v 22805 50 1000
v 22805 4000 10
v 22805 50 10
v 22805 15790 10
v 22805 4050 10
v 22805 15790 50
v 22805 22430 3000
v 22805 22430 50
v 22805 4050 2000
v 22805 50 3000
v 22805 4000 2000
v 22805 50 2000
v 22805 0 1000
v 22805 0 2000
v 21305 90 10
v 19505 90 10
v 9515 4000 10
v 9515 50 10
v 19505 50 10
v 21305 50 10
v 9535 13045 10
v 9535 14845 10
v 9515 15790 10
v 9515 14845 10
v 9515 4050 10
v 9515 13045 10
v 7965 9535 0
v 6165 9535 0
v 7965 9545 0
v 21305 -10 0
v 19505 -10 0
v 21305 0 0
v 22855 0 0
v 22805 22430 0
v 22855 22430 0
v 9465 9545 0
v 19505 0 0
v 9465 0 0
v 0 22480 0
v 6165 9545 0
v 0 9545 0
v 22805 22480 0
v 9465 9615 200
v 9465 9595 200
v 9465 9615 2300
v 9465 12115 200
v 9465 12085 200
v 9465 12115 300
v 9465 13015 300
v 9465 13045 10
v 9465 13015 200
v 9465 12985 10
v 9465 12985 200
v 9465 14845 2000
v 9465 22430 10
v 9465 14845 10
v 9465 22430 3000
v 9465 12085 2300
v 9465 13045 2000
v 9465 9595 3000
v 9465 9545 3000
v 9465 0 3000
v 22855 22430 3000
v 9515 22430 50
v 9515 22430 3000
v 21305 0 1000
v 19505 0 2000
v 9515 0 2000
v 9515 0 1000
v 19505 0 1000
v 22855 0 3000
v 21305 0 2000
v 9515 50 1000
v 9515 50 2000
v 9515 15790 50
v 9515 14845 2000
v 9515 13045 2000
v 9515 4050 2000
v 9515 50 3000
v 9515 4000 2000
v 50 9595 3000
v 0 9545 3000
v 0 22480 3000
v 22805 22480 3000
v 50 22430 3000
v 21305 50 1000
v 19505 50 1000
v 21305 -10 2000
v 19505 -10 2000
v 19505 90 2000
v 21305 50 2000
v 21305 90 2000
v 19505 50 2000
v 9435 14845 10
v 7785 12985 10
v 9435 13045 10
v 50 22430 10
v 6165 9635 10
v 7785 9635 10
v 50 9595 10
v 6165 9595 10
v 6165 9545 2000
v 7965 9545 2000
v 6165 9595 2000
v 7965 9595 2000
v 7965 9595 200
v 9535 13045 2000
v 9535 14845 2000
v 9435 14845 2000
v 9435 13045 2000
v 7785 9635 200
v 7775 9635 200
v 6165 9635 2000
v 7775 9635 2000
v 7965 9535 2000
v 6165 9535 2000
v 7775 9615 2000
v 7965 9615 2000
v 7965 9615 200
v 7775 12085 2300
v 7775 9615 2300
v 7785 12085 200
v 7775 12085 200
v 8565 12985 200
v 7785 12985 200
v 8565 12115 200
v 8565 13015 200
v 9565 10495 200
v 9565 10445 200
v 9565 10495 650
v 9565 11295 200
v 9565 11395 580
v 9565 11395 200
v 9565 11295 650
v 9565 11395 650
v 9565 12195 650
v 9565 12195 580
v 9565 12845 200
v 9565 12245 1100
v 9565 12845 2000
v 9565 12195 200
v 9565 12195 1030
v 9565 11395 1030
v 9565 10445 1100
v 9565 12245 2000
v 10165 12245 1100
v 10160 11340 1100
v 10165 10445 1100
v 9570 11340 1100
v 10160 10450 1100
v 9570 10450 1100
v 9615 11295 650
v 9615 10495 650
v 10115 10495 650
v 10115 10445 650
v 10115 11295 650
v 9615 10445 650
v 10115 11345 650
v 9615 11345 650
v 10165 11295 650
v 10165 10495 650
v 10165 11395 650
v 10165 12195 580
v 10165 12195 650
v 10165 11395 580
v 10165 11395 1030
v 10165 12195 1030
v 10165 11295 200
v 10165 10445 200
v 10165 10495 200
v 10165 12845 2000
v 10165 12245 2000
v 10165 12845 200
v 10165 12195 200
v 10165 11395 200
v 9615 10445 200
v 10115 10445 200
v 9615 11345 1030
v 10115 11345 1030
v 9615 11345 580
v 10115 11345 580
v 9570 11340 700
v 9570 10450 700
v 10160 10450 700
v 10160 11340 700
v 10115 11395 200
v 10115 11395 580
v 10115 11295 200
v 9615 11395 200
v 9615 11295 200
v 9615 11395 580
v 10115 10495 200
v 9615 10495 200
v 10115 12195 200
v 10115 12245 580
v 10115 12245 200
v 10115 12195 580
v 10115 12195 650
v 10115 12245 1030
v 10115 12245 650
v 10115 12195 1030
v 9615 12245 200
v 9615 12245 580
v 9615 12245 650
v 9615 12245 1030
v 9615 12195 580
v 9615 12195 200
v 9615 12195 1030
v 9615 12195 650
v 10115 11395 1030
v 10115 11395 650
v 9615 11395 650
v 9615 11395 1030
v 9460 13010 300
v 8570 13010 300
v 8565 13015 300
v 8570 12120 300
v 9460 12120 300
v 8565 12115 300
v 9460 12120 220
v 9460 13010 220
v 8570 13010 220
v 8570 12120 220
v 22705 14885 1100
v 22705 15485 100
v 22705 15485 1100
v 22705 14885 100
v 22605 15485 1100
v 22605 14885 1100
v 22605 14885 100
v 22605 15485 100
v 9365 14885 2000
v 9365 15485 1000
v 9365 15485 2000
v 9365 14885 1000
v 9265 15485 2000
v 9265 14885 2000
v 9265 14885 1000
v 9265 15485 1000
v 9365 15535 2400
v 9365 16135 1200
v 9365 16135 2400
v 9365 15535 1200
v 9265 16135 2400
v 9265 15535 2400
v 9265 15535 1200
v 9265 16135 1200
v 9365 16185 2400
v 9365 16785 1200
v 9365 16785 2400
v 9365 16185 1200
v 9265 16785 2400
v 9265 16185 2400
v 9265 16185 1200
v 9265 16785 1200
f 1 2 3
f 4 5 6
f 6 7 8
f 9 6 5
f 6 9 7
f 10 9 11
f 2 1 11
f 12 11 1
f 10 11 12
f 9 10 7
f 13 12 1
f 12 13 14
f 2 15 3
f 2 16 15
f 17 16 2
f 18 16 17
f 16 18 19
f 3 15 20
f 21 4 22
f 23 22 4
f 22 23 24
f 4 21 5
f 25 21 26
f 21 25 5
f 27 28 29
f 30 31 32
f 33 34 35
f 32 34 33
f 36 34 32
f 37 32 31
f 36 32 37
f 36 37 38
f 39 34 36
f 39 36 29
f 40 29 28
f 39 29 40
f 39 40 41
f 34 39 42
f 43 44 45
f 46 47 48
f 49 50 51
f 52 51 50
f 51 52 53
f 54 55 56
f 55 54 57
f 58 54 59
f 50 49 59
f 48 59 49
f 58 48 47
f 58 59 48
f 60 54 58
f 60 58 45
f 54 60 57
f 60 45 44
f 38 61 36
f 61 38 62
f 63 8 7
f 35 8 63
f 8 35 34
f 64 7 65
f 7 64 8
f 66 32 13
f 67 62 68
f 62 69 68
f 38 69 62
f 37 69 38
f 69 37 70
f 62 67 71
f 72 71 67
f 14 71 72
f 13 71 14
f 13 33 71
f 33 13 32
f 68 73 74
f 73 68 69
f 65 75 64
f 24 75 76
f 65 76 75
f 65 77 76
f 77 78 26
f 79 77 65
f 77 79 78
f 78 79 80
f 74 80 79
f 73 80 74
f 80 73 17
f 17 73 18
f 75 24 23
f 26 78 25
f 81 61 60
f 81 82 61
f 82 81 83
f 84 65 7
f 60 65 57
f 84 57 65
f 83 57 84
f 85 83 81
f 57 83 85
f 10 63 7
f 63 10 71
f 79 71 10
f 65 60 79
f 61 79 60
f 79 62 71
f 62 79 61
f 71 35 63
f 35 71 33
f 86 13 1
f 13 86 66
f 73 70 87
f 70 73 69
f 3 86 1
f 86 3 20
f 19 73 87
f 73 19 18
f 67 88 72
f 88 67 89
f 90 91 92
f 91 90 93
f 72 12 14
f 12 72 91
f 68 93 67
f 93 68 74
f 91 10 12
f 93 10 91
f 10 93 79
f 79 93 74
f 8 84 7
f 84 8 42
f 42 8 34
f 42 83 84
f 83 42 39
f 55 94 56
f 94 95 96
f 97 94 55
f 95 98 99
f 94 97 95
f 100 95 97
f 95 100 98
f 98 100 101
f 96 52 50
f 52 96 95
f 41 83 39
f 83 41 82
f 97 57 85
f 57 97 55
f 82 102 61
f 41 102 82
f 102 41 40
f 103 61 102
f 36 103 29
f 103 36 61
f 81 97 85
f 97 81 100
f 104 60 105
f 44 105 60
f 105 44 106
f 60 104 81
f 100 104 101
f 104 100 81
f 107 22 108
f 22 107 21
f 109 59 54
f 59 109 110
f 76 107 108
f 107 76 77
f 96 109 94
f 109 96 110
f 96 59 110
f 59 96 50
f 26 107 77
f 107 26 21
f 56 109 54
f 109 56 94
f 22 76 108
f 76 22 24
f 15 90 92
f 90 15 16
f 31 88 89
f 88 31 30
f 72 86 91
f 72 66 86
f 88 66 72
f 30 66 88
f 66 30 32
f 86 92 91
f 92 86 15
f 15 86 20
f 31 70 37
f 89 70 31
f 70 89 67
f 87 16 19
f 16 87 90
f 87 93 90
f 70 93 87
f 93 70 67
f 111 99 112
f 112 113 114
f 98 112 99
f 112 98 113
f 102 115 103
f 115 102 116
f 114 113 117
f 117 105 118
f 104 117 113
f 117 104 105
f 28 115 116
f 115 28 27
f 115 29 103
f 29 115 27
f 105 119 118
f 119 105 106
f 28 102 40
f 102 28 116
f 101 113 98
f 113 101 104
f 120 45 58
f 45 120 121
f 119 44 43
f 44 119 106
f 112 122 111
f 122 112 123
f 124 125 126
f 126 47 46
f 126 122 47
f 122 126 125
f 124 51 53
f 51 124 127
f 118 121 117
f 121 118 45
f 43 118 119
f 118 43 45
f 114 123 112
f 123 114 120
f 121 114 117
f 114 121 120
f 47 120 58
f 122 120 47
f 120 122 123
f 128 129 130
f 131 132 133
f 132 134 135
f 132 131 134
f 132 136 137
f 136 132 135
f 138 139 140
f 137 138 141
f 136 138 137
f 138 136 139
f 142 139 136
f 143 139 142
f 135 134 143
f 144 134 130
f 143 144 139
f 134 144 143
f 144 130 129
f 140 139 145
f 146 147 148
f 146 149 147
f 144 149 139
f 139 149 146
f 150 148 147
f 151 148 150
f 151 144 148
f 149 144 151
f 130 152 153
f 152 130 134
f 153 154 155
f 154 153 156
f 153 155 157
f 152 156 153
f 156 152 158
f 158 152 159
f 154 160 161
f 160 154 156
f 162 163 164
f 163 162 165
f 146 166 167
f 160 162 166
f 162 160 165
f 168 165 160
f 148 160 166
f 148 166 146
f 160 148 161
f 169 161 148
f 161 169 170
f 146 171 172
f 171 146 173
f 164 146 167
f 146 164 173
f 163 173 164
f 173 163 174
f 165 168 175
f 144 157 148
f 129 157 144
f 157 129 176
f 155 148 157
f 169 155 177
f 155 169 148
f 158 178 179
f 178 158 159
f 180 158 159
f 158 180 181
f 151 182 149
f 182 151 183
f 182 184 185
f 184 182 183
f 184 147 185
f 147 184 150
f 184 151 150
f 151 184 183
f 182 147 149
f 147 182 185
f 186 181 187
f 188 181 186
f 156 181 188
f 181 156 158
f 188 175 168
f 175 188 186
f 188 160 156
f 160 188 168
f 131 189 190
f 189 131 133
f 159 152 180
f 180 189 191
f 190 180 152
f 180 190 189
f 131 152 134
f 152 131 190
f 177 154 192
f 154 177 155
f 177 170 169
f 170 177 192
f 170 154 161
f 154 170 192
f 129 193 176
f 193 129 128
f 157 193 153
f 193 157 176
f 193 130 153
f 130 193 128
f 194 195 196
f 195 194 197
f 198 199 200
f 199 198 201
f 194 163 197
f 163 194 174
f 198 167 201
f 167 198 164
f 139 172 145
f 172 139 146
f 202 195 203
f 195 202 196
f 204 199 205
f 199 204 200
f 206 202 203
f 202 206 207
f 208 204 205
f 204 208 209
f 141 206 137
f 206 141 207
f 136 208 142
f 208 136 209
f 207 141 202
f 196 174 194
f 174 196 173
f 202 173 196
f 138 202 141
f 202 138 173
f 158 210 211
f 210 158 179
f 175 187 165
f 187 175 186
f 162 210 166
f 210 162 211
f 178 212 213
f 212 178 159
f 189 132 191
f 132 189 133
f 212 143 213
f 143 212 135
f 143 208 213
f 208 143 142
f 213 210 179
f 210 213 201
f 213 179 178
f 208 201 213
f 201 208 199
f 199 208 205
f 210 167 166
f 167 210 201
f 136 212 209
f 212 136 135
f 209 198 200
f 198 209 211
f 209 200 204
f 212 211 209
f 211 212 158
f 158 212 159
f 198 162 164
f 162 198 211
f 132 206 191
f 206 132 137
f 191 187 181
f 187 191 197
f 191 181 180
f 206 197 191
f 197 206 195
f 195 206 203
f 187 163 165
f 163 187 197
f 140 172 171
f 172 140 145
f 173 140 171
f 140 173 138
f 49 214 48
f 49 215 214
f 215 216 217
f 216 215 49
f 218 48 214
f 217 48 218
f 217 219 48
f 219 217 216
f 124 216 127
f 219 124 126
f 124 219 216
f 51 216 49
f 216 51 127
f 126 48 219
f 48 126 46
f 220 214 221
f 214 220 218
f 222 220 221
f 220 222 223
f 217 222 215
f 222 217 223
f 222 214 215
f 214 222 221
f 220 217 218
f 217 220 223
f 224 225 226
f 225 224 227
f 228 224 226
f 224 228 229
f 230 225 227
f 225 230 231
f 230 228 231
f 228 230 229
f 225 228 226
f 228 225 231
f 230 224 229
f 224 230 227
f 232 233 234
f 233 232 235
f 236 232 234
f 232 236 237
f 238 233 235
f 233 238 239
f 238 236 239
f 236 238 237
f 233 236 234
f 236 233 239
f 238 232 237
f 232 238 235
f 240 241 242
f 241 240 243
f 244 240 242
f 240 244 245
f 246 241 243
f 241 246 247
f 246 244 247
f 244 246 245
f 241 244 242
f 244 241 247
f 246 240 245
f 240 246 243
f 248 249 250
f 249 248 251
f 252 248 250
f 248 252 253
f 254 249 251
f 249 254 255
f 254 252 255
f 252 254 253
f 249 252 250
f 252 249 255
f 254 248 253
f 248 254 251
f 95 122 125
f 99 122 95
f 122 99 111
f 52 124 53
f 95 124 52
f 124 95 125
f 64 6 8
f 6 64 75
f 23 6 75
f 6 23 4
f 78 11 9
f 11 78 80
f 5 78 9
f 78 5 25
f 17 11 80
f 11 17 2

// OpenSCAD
//
//
//


//toilet size
tx = 1235;
ty = 1690;
//souko size
sx = 9465;
sy = 12885;
//jimsho size
jx = 13340;
jy = 2140+13650+6640; 
jz = 3000;
//diff
dy = jy-sy;
//
//
//

translate([jx+sx-200, sy+2000, 100])color("blue") cube([100, 600, 1000]);
translate([sx-200, sy+2000, 1000])color("blue") cube([100, 600, 1000]);
translate([sx-200, sy+2000+650, 1200])color("blue") cube([100, 600, 1200]);
translate([sx-200, sy+2000+650*2, 1200])color("blue") cube([100, 600, 1200]);
translate([9465, 0,0]) big_building(jx, jy, jz);
translate([0,2140+13650+6640-12885,0])souko(sx, sy, 3000);

translate ([sx-30, dy+3500, 0]) both_door();
translate ([sx+jx-1500, -10, 0]) rotate([0,0, 90]) both_door();
translate ([sx-1500, dy-10, 0]) rotate([0,0, 90]) both_door();

translate([sx, 150, 200])rotate([0,0,90]) toilet_space();
translate([sx-1680, sy-1263*2-800, 0])color("brown")cube([1680, 1263*2+900,200]);
translate([sx, jy-6640, 0])color("black")cube([jx, 6640, 50]);
//間仕切
translate([sx, 4000,0]) color("whithe")cube([jx, 50, jz-1000]);
translate([sx+700, dy+1800, 200]) rotate([0,0,180])sink_area();
// translate([sx+100, dy-3000,0]) mini_kichen();
translate([sx-900,dy+1260*2+50, 200]) color("silver")pan();

module pan(){
  //pan
  translate([0,0,0])
  difference(){
    translate([0,0,0]) cube([900, 900, 100]);
    translate([5,5,20]) cube([890, 890, 100]);
  }
}

module big_building(x, y, h){
  cube([x, y, 10]);
  cube([50, y, h]);
  translate([x, 0, 0])cube([50, y, h]);
  translate([0, 0, 0])cube([x, 50, h/3]);
  translate([0, 0, h*2/3])cube([x, 50, h/3]);
  translate([0, y, 0])cube([x, 50, h]);
}

module souko(x, y, h){
  cube([x, y, 10]);
  translate([0, 0, 0])cube([50, y, h]);
  translate([0, 0, 0])cube([x, 50, h]);
  translate([0, y, 0])cube([x, 50, h]);
}

module toilet(){
  color("white") cube([1235, 1690, 2100]);
}

module both_door(){
  color("silver"){
    cube([100, 900, 2000]);
    translate([0, 900, 0])cube([100,900,2000]);
  }
}

module both_half_door(){
  color("silver"){
    cube([100, 900, 2000]);
    translate([0, 900, 0])cube([100,450,2000]);
  }
}

module toilet_space(){
  translate([sx, 0,0]) toilet();
  translate([sx+tx, 0,0]) toilet();
  //translate([sx+tx*2, 0,0]) toilet();
}

module sink_area(){
  color("silver"){
  //sink 
  //translate([0,900,0])
  union(){
  translate([0,0,450])
  difference(){
    translate([0,0,0]) cube([600, 900, 450]);
    translate([5,5,50]) cube([590, 890, 450]);
  }
  for(i=[0:850:900]){
    translate([0, i, 0]) cube([50,50,450]);
    translate([550, i, 0]) cube([50,50,450]);
  }
  }
  //table
  translate([0,-900,0])
  union(){
  translate([0,0,900-70]) cube([600, 900, 70]);
  translate([0,0,450-70]) cube([600, 900, 70]);
  for(i=[0:850:900]){
    translate([0, i, 450]) cube([50,50,450]);
    translate([550, i, 450]) cube([50,50,450]);
    translate([0, i, 0]) cube([50,50,450]);
    translate([550, i, 0]) cube([50,50,450]);
  }
}
/*
  //pan
  translate([0,900,0])
  difference(){
    translate([0,0,0]) cube([600, 900, 100]);
    translate([5,5,20]) cube([590, 890, 100]);
  }
  */
  }
  //fridge
  color("white") translate([0, -900-600, 0]) cube([600,600, 1800]);
}

module mini_kichen(){
  color("silver"){
    difference(){
      cube([500, 1500, 1800]);
      translate([50, -50, 800]) cube([500, 1600, 800]);
      translate([100, 50, 500]) cube([350, 700, 350]);
    }
  }
}

module locker_toilet(){
  cube([1850, 3650, 2625]);
}
